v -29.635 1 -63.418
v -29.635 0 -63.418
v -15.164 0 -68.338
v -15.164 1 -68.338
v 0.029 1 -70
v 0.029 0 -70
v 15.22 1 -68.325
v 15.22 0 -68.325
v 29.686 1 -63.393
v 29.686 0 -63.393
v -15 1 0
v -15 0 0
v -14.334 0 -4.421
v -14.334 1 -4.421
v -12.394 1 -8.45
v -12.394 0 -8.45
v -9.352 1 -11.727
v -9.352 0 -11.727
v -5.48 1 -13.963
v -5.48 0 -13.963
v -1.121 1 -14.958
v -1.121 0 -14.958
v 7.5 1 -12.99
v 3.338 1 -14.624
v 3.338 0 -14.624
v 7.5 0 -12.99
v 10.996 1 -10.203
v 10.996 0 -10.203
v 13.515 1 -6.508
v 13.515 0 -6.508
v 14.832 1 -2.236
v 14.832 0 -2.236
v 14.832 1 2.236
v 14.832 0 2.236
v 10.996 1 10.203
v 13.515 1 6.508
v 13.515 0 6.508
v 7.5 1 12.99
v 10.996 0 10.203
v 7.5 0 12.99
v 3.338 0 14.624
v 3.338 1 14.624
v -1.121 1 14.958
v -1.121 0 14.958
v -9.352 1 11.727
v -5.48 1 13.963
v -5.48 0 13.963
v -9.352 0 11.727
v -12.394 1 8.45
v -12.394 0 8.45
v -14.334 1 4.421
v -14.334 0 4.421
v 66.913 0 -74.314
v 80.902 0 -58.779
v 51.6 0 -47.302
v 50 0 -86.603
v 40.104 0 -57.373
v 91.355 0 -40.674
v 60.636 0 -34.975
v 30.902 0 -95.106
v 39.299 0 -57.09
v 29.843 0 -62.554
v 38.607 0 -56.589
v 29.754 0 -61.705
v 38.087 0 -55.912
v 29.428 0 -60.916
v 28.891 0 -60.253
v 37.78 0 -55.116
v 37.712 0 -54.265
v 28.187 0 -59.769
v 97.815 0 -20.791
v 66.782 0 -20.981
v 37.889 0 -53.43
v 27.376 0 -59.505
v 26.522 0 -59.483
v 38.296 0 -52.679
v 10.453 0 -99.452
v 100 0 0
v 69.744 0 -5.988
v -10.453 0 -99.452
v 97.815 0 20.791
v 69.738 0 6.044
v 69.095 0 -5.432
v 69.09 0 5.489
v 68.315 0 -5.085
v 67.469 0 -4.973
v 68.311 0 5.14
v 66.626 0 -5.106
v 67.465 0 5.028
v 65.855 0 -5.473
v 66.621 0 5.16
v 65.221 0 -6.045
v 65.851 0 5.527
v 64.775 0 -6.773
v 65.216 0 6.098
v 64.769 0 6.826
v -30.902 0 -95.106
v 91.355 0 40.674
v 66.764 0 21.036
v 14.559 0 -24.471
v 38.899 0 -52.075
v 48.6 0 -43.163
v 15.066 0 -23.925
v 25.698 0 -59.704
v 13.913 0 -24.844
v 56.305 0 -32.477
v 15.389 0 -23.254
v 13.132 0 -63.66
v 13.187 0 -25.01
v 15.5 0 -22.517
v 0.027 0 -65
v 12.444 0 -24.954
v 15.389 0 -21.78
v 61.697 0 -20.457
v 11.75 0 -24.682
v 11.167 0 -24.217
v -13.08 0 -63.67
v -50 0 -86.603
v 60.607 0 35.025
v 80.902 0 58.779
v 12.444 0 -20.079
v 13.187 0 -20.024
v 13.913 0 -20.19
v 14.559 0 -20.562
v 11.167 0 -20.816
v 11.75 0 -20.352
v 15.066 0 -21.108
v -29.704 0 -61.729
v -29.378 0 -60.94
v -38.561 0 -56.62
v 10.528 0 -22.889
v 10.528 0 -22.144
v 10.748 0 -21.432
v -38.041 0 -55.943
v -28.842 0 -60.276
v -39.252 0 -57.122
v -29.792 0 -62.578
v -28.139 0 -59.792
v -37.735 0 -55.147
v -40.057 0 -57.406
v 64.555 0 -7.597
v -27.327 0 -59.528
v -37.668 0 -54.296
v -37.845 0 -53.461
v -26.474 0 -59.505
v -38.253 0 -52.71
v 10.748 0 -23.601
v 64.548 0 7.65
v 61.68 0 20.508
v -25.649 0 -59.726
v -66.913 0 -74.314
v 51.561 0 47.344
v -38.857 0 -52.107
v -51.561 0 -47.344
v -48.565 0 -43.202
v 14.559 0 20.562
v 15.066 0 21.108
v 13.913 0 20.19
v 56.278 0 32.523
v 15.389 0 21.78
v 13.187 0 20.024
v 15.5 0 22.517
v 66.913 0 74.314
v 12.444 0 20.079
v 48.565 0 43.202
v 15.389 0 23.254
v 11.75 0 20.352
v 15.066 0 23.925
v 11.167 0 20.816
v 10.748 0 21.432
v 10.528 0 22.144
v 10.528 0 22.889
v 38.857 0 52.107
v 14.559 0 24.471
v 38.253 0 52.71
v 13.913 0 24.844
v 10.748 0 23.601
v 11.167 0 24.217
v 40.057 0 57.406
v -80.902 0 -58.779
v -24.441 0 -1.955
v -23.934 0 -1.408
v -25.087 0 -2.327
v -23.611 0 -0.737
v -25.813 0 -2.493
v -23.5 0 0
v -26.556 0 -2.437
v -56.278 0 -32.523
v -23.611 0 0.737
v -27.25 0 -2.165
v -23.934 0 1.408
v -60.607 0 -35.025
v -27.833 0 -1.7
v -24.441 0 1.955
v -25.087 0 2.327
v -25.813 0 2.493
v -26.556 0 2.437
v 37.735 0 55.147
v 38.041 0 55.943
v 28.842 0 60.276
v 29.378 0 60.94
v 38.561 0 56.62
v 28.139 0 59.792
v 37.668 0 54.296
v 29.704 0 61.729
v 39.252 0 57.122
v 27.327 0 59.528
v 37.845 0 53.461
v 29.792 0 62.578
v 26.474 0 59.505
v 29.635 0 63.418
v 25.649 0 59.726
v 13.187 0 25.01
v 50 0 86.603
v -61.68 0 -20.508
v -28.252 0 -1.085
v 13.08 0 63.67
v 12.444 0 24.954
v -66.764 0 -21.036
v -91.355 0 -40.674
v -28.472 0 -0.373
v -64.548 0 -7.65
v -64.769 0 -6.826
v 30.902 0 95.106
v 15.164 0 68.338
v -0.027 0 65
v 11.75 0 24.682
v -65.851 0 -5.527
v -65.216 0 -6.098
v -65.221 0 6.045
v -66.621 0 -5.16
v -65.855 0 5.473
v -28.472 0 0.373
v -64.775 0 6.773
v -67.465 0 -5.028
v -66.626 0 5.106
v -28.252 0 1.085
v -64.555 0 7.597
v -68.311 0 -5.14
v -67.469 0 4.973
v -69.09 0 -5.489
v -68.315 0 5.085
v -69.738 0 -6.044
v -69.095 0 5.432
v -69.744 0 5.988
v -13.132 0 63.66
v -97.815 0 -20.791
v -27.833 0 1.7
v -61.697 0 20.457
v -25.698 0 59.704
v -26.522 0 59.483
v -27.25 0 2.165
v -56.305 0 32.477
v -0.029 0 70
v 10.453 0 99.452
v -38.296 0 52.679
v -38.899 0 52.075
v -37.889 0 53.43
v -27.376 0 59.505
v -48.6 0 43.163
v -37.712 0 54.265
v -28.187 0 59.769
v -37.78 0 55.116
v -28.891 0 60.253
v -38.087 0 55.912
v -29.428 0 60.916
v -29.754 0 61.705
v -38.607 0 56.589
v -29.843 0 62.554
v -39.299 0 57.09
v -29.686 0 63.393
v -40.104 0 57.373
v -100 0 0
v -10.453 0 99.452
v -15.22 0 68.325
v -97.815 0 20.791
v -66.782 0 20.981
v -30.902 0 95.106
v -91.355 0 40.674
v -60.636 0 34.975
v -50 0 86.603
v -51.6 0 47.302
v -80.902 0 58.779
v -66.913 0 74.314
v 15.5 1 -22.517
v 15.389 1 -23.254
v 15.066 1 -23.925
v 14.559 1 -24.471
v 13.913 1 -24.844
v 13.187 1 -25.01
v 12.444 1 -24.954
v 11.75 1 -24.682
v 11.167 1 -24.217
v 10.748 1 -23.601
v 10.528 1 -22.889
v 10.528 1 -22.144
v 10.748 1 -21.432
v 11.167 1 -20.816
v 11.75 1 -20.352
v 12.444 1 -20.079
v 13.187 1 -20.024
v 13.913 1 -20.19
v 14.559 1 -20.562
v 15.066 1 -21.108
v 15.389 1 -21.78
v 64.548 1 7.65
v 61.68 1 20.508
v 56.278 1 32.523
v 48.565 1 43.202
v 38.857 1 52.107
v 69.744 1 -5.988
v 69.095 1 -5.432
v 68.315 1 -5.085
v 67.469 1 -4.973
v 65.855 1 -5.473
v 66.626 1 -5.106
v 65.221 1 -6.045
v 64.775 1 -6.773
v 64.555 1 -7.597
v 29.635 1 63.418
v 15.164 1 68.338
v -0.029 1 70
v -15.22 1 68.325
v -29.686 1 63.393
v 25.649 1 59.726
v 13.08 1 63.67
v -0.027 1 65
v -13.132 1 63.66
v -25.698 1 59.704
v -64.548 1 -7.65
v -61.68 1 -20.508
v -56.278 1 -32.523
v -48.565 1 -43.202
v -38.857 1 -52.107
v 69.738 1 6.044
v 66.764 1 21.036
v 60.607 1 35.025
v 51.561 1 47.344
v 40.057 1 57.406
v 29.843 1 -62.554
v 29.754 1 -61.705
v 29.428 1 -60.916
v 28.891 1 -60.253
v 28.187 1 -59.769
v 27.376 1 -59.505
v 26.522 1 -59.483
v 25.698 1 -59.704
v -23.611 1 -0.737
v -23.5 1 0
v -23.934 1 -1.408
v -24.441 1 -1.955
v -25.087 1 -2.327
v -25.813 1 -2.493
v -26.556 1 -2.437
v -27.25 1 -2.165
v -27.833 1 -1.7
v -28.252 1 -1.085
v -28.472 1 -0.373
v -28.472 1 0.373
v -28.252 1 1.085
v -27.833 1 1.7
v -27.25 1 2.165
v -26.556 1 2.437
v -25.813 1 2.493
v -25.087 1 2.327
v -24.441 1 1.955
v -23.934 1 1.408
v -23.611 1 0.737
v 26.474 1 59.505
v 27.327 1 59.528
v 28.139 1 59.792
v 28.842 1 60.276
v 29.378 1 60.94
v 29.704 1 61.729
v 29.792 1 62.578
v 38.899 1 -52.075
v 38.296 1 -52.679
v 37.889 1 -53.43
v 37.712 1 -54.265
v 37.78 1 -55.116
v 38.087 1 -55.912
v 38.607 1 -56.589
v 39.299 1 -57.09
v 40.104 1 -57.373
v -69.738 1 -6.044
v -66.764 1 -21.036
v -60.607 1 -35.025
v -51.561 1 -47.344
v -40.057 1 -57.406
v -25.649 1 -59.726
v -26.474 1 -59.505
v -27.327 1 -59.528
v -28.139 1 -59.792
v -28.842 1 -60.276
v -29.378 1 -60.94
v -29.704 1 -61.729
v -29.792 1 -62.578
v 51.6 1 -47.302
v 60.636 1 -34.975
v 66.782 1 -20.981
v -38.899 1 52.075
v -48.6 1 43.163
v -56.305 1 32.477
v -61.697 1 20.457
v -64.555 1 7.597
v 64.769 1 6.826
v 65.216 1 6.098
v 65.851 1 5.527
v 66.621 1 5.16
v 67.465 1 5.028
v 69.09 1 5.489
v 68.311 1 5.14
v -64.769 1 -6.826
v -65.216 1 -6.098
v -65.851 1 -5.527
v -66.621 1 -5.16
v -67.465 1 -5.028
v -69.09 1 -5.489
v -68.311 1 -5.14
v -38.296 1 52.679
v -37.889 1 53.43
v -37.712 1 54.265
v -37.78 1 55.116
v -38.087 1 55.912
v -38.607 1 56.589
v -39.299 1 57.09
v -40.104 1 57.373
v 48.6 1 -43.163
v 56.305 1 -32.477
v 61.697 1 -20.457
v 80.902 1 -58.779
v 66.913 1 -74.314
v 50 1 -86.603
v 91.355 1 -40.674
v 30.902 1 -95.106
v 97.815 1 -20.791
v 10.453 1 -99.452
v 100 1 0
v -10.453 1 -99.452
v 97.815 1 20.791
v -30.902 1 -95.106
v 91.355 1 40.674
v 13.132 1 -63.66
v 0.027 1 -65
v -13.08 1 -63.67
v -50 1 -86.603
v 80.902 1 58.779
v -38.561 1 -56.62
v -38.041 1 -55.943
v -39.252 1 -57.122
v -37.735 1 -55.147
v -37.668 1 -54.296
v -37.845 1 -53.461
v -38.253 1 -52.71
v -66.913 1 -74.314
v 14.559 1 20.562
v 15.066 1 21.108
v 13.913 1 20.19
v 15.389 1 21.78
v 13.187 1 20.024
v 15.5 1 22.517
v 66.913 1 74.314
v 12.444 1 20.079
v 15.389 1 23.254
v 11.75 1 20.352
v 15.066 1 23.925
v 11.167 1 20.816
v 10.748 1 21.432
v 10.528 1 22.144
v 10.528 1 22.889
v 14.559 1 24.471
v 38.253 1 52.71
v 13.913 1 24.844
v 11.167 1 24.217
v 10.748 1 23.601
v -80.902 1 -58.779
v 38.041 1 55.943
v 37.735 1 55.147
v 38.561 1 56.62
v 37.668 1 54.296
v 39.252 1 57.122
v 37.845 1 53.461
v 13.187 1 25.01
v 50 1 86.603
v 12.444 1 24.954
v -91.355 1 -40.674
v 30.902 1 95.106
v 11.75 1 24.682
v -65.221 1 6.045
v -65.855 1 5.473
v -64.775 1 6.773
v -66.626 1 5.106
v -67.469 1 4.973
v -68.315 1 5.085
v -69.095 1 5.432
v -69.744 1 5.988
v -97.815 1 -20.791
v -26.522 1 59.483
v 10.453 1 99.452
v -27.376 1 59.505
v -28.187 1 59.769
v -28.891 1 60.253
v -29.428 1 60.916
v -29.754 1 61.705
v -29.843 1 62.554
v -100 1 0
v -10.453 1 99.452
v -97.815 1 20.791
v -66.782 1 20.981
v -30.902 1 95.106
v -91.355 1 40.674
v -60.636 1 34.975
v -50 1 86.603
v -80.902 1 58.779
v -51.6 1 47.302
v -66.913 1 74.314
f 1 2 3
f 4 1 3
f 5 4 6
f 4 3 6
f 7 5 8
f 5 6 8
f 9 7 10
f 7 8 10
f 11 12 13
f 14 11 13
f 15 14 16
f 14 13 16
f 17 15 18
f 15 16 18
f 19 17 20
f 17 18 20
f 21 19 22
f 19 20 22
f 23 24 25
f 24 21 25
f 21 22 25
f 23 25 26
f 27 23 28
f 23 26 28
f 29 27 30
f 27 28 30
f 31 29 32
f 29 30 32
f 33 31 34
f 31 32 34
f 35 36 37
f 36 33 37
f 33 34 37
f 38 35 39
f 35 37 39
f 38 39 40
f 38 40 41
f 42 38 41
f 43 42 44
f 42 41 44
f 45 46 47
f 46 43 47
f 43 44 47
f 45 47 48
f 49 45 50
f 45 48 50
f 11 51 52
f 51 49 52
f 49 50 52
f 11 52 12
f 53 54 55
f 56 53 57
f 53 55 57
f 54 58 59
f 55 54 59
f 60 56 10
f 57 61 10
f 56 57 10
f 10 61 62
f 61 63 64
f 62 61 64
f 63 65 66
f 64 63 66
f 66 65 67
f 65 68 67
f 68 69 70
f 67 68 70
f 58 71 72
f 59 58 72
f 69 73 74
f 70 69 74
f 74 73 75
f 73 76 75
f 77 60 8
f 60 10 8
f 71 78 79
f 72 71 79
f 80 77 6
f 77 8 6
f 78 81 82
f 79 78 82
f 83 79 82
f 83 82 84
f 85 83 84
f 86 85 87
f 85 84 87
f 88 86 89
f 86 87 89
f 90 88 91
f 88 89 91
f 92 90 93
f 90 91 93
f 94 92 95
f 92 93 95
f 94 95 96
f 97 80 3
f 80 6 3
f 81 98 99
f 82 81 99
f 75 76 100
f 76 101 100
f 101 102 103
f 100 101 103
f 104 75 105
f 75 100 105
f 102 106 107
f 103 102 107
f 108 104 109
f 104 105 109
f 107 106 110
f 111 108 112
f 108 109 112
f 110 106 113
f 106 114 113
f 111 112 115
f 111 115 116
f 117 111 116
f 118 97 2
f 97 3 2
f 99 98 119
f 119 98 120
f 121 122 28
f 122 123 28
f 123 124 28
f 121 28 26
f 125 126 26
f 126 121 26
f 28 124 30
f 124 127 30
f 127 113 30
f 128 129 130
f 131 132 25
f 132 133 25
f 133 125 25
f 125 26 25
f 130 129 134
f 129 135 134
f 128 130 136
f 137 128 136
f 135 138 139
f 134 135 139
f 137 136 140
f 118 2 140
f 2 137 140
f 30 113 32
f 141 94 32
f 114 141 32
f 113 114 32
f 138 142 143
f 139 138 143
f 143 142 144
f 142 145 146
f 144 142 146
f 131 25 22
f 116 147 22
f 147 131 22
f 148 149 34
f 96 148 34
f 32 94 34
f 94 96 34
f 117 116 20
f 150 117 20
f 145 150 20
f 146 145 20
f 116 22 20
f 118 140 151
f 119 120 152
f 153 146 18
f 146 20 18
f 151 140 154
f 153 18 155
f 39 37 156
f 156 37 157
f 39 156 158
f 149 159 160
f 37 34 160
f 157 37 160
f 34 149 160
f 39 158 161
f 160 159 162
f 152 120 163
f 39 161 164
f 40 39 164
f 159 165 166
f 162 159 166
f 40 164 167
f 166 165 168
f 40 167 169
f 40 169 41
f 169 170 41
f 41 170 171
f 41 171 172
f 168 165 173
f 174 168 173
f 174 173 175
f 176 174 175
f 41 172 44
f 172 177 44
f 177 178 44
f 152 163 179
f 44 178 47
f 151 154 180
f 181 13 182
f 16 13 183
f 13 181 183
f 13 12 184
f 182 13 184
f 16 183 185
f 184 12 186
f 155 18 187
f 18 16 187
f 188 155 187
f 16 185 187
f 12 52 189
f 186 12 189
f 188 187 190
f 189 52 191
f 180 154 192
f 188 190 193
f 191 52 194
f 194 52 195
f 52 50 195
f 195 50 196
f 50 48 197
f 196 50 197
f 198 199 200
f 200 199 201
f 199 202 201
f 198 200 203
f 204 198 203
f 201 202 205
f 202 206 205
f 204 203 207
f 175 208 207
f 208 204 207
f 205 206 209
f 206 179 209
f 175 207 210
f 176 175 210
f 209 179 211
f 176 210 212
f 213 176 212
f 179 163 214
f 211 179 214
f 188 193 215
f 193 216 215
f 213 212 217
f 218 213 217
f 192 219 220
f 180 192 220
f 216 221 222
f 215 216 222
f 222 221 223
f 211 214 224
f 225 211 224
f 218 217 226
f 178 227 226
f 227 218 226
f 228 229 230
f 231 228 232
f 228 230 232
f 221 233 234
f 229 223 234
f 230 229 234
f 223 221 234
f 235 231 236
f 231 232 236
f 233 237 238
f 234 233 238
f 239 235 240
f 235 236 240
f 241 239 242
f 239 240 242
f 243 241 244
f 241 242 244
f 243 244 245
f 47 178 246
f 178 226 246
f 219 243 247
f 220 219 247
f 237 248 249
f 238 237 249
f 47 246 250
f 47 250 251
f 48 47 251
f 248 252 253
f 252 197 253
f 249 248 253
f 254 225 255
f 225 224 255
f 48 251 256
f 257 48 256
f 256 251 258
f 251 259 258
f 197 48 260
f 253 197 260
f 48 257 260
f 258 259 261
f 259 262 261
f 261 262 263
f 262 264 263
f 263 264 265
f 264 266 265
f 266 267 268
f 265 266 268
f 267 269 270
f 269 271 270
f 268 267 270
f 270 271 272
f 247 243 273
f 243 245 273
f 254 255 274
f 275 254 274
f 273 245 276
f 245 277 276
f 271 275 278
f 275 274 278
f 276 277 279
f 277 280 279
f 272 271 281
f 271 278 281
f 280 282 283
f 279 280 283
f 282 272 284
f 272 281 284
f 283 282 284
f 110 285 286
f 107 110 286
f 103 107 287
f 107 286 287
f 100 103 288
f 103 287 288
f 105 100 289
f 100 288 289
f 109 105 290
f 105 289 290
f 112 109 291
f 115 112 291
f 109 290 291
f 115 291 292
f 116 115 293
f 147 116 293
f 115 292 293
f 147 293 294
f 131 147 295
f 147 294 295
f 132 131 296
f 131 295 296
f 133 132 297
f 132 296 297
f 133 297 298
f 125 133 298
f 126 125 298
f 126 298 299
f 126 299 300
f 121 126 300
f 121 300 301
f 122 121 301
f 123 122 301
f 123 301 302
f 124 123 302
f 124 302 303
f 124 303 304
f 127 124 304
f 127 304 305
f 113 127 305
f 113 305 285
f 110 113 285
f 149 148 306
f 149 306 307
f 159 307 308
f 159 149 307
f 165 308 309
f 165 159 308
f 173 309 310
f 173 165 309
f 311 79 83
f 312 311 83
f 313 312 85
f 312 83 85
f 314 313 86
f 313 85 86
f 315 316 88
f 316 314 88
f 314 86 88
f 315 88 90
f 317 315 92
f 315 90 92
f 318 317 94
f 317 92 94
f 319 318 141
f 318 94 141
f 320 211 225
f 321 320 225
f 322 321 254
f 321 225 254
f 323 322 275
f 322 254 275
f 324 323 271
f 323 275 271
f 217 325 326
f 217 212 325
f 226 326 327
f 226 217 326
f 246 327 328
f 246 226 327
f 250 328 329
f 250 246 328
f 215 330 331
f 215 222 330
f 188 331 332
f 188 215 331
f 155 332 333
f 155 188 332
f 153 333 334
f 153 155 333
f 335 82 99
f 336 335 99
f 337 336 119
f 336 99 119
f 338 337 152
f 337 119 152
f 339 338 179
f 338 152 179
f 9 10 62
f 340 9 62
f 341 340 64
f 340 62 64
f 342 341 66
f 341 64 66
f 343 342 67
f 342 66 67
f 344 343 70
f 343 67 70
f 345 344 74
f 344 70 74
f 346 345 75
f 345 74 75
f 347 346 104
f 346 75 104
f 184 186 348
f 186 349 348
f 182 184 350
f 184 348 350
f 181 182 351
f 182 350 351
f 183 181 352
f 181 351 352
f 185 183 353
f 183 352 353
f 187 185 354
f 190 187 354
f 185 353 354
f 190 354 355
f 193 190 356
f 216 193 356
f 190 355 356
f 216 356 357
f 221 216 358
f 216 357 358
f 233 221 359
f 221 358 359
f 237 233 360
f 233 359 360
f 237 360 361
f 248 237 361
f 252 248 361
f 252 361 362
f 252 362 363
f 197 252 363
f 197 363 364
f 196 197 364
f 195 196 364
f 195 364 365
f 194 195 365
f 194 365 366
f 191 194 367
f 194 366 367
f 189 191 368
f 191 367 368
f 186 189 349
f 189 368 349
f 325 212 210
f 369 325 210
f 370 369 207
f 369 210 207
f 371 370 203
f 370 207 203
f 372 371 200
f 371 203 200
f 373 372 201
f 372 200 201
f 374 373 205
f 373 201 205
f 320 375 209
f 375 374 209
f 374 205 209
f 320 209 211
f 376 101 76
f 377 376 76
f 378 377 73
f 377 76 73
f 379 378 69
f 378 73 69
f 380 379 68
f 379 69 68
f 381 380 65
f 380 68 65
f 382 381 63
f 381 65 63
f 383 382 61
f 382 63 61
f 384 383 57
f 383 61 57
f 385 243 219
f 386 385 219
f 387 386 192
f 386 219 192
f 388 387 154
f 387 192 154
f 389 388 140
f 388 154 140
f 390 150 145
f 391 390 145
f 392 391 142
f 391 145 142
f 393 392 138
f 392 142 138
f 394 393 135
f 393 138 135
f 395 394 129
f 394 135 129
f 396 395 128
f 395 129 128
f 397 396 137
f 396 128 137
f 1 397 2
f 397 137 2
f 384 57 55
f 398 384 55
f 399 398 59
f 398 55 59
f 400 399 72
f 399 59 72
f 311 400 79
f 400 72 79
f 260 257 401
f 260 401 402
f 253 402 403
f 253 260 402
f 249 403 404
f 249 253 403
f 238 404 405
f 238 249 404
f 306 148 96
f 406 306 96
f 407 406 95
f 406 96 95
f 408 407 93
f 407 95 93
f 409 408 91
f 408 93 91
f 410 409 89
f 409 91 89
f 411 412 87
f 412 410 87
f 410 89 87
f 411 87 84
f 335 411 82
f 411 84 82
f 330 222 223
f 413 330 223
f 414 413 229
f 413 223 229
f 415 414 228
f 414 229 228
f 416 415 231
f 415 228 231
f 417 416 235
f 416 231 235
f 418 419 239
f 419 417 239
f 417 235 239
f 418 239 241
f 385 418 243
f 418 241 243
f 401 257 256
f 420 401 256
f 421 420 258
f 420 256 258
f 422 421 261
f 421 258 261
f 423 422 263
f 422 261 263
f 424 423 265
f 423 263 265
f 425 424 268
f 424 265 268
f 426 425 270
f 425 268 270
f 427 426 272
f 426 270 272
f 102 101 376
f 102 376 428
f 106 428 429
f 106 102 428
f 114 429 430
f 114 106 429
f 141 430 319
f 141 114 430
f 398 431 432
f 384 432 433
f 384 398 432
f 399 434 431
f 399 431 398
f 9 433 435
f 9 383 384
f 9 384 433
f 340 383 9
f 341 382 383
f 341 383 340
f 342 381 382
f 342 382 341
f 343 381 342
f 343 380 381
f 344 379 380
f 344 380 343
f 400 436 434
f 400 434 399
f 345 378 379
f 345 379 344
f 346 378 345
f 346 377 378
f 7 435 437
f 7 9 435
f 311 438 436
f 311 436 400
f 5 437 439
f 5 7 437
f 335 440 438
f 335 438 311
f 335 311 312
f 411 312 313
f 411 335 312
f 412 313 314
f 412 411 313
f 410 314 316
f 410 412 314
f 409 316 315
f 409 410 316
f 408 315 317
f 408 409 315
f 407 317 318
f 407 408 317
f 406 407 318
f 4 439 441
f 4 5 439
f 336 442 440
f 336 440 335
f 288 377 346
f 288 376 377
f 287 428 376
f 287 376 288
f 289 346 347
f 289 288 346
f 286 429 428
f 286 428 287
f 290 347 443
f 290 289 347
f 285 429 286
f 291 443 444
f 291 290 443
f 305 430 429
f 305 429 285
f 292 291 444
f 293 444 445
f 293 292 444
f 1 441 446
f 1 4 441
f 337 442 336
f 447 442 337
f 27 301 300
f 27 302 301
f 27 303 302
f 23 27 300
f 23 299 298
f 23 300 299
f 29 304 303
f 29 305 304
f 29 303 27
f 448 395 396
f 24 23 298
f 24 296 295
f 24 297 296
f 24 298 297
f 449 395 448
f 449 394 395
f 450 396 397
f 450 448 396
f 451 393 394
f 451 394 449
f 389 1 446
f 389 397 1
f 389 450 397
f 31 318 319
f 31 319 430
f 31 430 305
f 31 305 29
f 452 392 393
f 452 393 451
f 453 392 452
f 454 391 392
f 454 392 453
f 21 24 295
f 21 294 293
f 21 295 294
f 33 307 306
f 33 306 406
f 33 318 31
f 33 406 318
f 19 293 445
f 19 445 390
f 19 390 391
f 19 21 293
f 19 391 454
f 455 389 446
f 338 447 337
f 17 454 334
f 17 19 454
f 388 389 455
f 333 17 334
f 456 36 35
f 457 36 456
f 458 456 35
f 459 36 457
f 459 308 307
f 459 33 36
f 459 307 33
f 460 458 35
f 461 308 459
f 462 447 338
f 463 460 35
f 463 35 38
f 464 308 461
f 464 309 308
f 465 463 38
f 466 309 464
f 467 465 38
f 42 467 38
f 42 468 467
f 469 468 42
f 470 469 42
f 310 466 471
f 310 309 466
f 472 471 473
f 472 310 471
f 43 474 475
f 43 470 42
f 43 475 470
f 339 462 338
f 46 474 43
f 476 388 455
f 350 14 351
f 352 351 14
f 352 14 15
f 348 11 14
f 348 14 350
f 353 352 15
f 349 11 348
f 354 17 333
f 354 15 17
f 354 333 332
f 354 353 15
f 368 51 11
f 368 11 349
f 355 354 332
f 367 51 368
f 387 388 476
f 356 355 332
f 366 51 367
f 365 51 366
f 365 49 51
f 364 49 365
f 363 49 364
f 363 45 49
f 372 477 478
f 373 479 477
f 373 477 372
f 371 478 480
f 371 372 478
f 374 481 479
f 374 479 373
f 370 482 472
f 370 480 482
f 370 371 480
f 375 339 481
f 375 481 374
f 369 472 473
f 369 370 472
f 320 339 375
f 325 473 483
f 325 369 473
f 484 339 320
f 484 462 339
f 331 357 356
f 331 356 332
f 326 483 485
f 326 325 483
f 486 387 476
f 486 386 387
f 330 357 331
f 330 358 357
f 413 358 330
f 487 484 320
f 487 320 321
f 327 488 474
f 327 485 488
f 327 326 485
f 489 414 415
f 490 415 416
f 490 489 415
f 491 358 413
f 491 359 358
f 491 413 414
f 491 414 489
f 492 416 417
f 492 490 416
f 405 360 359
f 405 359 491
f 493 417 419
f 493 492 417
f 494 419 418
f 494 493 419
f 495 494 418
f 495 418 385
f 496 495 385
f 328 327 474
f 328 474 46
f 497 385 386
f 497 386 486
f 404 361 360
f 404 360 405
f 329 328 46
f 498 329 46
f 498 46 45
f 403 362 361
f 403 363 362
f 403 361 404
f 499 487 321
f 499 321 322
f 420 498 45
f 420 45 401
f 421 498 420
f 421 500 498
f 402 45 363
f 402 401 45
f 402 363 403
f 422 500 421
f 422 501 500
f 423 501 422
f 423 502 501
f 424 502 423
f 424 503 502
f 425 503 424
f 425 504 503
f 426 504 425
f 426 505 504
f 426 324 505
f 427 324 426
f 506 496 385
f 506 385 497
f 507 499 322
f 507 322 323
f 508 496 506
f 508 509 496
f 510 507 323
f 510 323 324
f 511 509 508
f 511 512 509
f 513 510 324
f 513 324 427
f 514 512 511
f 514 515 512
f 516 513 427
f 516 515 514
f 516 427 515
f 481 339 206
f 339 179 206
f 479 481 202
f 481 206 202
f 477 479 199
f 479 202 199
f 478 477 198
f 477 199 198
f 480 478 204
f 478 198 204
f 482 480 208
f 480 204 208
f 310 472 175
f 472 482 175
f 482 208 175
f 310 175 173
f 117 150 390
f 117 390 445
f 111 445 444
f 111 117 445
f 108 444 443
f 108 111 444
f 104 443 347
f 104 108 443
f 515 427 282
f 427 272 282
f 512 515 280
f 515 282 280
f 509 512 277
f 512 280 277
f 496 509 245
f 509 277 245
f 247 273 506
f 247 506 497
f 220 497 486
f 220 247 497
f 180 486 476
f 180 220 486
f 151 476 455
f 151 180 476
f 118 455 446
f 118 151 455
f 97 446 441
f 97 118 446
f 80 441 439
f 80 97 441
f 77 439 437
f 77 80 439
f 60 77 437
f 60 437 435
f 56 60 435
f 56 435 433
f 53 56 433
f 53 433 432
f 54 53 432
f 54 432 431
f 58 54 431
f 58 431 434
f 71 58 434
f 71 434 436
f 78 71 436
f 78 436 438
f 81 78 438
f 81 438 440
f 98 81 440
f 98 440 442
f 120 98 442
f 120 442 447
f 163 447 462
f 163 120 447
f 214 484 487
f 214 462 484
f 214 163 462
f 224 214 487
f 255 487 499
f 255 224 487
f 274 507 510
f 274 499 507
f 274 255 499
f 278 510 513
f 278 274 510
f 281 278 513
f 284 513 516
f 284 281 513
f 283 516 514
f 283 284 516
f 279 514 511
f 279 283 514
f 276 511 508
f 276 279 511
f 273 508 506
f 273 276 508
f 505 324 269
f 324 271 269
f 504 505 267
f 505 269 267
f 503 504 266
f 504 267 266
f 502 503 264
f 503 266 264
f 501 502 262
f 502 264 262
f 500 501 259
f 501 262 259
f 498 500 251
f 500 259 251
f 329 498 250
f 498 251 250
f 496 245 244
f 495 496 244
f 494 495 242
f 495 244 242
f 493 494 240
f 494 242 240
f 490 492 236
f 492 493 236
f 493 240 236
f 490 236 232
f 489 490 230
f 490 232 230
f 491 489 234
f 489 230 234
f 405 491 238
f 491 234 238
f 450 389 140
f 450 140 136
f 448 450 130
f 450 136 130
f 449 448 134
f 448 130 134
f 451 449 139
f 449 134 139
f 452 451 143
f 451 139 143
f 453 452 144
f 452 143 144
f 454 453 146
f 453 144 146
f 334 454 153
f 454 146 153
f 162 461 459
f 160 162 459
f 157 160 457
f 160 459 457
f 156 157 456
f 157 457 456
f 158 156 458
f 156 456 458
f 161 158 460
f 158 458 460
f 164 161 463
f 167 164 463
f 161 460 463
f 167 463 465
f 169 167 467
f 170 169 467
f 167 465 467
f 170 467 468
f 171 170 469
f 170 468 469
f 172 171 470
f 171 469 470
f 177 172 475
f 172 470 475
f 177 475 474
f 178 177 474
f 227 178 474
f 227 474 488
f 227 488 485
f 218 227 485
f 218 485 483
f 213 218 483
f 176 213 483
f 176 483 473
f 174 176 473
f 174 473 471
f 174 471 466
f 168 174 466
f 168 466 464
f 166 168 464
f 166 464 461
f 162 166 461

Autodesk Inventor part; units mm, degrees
ref_plane "YZ Plane" through (0, 0, 0) normal (1, 0, 0) x (0, 1, 0)
ref_plane "XZ Plane" through (0, 0, 0) normal (0, 1, 0) x (-1, 0, 0)
ref_plane "XY Plane" through (0, 0, 0) normal (0, 0, 1) x (1, 0, 0)
sketch "Szkic1" plane through (0, 0, 0) normal (0, 1, 0) x (-1, 0, 0)
  circle A0 centre (0, 0) radius 15
  circle A1 centre (0, 0) radius 40
  circle A2 centre (0, 0) radius 100
  circle A3 centre (0, 0) radius 70
  circle A4 centre (0, 0) radius 65
  line L0 (70, 0) -> (65, 0)
  arc A5 (64.5545, 7.5974) -> (69.7435, 5.9875) centre (67.5065, 7.9448) ccw
  arc A6 (69.7385, -6.0444) -> (64.5482, -7.6502) centre (67.5, -8) ccw
  arc A7 (40.1039, 57.3731) -> (38.8994, 52.0753) centre (40.6782, 54.4567) ccw
  arc A8 (25.6977, 59.7045) -> (29.6864, 63.3933) centre (26.8728, 62.4348) ccw
  arc A9 (-29.6346, 63.4176) -> (-25.6489, 59.7255) centre (-26.8218, 62.4567) ccw
  arc A10 (-38.8568, 52.1071) -> (-40.057, 57.4059) centre (-40.6337, 54.4899) ccw
  arc A11 (-69.7385, 6.0444) -> (-64.5482, 7.6502) centre (-67.5, 8) ccw
  arc A12 (-64.5545, -7.5974) -> (-69.7435, -5.9875) centre (-67.5065, -7.9448) ccw
  arc A13 (-40.1039, -57.3731) -> (-38.8994, -52.0753) centre (-40.6782, -54.4567) ccw
  arc A14 (-25.6977, -59.7045) -> (-29.6864, -63.3933) centre (-26.8728, -62.4348) ccw
  arc A15 (29.6346, -63.4176) -> (25.6489, -59.7255) centre (26.8218, -62.4567) ccw
  arc A16 (38.8568, -52.1071) -> (40.057, -57.4059) centre (40.6337, -54.4899) ccw
  point P0 (-29.6346, 63.4176)
  point P1 (29.6864, 63.3933)
  point P2 (-38.8568, 52.1071)
  point P3 (-69.7385, 6.0444)
  point P4 (-40.1039, -57.3731)
  point P5 (-69.7435, -5.9875)
  point P6 (29.6346, -63.4176)
  point P7 (-29.6864, -63.3933)
  point P8 (38.8568, -52.1071)
  point P9 (40.057, -57.4059)
  point P10 (38.8994, 52.0753)
  point P11 (40.1039, 57.3731)
  dimension "d0" = 30
  dimension "d20" = 200
  dimension "d21" = 140
  dimension "d22" = 130
  dimension "d25" = 10
  dimension "d28" = 360
extrude "Wyciągnięcie proste1" add sketch "Szkic1" along normal blind 1 contours A1 | A2 | L0 A4 A5 A3 | A3 A6 A4 L0 | A4 | A7 A4 A8 A3 | A3 A15 A4 A16 | A9 A4 A10 A3 | A3 A13 A4 A14 | A11 A4 A12 A3
sketch "Szkic3" plane through (0, 1, 0) normal (0, 1, 0) x (1, 0, 0)
  circle A0 centre (0, 0) radius 22.5
  circle A1 centre (-26, 0) radius 2.5
  circle A2 centre (13, -22.5167) radius 2.5
  circle A3 centre (13, 22.5167) radius 2.5
  dimension "d42" = 45
  dimension "d46" = 5
  dimension "d50" = 360
  dimension "d54" = 26
extrude "Wyciągnięcie proste3" cut sketch "Szkic3" against normal blind 10 contours A1 | A2 | A3
sketch "Szkic4" plane through (0, 1, 0) normal (0, 1, 0) x (1, 0, 0)
  point P0 (0, 0)
properties part number "Tarcza_Okładzina" material "Stal, węglowa"
